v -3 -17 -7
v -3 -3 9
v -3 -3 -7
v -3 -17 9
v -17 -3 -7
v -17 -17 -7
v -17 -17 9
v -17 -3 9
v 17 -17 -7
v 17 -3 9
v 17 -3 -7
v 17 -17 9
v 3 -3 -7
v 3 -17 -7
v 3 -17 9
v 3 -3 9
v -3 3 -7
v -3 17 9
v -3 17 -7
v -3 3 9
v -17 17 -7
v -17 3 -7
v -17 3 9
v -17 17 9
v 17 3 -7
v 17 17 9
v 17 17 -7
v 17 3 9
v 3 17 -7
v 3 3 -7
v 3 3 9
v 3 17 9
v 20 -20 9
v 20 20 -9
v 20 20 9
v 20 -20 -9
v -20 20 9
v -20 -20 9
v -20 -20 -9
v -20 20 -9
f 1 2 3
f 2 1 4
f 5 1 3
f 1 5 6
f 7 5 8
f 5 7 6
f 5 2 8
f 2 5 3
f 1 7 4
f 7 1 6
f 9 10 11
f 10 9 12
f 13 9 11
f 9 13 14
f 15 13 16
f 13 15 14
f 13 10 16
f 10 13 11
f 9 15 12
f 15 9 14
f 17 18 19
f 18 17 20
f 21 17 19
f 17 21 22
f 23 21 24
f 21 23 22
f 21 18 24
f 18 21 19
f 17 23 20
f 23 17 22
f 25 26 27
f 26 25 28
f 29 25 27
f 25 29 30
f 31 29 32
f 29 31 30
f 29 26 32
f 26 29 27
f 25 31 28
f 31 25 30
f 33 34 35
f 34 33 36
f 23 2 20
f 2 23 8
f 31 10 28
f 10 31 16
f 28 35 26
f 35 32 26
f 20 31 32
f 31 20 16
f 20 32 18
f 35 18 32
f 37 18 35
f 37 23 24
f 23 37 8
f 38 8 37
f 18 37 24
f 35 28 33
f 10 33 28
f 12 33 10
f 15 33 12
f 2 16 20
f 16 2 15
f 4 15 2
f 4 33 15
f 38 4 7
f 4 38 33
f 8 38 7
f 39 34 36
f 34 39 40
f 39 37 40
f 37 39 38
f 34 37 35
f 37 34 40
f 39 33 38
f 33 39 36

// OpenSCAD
$fn = 32;

// ----------------------------------------------------------------------
// Pocket plate 40 x 40 x 18
// 2 x 2 pockets 14 mm square, 16 mm deep
// ----------------------------------------------------------------------

// --- parameters (mm) ---
thickness = 18;  // plate thickness
floor_t = 2;     // material left under each pocket
pocket = 14;     // pocket side length
pitch_x = 20;    // pocket pitch along X
pitch_y = 20;    // pocket pitch along Y
cols = 2;        // pockets per row
rows = 2;        // rows of pockets

// --- derived feature positions (mm) ---
depth = thickness - floor_t;        // = 16   pocket depth, down to the floor
span_x = (cols - 1) * pitch_x;      // = 20   distance between outer pockets
span_y = (rows - 1) * pitch_y;      // = 20   distance between outer pocket rows
origin_x = -span_x / 2;             // = -10   X of the first pocket
origin_y = -span_y / 2;             // = -10   Y of the first pocket
plate = [span_x + pocket + 6, span_y + pocket + 6, thickness];  // = [40, 40, 18]   overall size: pockets plus 3 mm of wall on each side
feature_centers = [
  [origin_x + 0 * pitch_x, origin_y + 0 * pitch_y],
  [origin_x + 1 * pitch_x, origin_y + 0 * pitch_y],
  [origin_x + 0 * pitch_x, origin_y + 1 * pitch_y],
  [origin_x + 1 * pitch_x, origin_y + 1 * pitch_y]
];   // pocket centres, used verbatim by the cutter loop

// plate outline, then one pocket per centre in feature_centers
difference() {
  cube(plate, center = true);
  for (centre = feature_centers)
    translate([centre[0] - pocket / 2, centre[1] - pocket / 2, plate[2] / 2 - depth])
      cube([pocket, pocket, depth + 1]);  // centred on the declared pocket centre
}
